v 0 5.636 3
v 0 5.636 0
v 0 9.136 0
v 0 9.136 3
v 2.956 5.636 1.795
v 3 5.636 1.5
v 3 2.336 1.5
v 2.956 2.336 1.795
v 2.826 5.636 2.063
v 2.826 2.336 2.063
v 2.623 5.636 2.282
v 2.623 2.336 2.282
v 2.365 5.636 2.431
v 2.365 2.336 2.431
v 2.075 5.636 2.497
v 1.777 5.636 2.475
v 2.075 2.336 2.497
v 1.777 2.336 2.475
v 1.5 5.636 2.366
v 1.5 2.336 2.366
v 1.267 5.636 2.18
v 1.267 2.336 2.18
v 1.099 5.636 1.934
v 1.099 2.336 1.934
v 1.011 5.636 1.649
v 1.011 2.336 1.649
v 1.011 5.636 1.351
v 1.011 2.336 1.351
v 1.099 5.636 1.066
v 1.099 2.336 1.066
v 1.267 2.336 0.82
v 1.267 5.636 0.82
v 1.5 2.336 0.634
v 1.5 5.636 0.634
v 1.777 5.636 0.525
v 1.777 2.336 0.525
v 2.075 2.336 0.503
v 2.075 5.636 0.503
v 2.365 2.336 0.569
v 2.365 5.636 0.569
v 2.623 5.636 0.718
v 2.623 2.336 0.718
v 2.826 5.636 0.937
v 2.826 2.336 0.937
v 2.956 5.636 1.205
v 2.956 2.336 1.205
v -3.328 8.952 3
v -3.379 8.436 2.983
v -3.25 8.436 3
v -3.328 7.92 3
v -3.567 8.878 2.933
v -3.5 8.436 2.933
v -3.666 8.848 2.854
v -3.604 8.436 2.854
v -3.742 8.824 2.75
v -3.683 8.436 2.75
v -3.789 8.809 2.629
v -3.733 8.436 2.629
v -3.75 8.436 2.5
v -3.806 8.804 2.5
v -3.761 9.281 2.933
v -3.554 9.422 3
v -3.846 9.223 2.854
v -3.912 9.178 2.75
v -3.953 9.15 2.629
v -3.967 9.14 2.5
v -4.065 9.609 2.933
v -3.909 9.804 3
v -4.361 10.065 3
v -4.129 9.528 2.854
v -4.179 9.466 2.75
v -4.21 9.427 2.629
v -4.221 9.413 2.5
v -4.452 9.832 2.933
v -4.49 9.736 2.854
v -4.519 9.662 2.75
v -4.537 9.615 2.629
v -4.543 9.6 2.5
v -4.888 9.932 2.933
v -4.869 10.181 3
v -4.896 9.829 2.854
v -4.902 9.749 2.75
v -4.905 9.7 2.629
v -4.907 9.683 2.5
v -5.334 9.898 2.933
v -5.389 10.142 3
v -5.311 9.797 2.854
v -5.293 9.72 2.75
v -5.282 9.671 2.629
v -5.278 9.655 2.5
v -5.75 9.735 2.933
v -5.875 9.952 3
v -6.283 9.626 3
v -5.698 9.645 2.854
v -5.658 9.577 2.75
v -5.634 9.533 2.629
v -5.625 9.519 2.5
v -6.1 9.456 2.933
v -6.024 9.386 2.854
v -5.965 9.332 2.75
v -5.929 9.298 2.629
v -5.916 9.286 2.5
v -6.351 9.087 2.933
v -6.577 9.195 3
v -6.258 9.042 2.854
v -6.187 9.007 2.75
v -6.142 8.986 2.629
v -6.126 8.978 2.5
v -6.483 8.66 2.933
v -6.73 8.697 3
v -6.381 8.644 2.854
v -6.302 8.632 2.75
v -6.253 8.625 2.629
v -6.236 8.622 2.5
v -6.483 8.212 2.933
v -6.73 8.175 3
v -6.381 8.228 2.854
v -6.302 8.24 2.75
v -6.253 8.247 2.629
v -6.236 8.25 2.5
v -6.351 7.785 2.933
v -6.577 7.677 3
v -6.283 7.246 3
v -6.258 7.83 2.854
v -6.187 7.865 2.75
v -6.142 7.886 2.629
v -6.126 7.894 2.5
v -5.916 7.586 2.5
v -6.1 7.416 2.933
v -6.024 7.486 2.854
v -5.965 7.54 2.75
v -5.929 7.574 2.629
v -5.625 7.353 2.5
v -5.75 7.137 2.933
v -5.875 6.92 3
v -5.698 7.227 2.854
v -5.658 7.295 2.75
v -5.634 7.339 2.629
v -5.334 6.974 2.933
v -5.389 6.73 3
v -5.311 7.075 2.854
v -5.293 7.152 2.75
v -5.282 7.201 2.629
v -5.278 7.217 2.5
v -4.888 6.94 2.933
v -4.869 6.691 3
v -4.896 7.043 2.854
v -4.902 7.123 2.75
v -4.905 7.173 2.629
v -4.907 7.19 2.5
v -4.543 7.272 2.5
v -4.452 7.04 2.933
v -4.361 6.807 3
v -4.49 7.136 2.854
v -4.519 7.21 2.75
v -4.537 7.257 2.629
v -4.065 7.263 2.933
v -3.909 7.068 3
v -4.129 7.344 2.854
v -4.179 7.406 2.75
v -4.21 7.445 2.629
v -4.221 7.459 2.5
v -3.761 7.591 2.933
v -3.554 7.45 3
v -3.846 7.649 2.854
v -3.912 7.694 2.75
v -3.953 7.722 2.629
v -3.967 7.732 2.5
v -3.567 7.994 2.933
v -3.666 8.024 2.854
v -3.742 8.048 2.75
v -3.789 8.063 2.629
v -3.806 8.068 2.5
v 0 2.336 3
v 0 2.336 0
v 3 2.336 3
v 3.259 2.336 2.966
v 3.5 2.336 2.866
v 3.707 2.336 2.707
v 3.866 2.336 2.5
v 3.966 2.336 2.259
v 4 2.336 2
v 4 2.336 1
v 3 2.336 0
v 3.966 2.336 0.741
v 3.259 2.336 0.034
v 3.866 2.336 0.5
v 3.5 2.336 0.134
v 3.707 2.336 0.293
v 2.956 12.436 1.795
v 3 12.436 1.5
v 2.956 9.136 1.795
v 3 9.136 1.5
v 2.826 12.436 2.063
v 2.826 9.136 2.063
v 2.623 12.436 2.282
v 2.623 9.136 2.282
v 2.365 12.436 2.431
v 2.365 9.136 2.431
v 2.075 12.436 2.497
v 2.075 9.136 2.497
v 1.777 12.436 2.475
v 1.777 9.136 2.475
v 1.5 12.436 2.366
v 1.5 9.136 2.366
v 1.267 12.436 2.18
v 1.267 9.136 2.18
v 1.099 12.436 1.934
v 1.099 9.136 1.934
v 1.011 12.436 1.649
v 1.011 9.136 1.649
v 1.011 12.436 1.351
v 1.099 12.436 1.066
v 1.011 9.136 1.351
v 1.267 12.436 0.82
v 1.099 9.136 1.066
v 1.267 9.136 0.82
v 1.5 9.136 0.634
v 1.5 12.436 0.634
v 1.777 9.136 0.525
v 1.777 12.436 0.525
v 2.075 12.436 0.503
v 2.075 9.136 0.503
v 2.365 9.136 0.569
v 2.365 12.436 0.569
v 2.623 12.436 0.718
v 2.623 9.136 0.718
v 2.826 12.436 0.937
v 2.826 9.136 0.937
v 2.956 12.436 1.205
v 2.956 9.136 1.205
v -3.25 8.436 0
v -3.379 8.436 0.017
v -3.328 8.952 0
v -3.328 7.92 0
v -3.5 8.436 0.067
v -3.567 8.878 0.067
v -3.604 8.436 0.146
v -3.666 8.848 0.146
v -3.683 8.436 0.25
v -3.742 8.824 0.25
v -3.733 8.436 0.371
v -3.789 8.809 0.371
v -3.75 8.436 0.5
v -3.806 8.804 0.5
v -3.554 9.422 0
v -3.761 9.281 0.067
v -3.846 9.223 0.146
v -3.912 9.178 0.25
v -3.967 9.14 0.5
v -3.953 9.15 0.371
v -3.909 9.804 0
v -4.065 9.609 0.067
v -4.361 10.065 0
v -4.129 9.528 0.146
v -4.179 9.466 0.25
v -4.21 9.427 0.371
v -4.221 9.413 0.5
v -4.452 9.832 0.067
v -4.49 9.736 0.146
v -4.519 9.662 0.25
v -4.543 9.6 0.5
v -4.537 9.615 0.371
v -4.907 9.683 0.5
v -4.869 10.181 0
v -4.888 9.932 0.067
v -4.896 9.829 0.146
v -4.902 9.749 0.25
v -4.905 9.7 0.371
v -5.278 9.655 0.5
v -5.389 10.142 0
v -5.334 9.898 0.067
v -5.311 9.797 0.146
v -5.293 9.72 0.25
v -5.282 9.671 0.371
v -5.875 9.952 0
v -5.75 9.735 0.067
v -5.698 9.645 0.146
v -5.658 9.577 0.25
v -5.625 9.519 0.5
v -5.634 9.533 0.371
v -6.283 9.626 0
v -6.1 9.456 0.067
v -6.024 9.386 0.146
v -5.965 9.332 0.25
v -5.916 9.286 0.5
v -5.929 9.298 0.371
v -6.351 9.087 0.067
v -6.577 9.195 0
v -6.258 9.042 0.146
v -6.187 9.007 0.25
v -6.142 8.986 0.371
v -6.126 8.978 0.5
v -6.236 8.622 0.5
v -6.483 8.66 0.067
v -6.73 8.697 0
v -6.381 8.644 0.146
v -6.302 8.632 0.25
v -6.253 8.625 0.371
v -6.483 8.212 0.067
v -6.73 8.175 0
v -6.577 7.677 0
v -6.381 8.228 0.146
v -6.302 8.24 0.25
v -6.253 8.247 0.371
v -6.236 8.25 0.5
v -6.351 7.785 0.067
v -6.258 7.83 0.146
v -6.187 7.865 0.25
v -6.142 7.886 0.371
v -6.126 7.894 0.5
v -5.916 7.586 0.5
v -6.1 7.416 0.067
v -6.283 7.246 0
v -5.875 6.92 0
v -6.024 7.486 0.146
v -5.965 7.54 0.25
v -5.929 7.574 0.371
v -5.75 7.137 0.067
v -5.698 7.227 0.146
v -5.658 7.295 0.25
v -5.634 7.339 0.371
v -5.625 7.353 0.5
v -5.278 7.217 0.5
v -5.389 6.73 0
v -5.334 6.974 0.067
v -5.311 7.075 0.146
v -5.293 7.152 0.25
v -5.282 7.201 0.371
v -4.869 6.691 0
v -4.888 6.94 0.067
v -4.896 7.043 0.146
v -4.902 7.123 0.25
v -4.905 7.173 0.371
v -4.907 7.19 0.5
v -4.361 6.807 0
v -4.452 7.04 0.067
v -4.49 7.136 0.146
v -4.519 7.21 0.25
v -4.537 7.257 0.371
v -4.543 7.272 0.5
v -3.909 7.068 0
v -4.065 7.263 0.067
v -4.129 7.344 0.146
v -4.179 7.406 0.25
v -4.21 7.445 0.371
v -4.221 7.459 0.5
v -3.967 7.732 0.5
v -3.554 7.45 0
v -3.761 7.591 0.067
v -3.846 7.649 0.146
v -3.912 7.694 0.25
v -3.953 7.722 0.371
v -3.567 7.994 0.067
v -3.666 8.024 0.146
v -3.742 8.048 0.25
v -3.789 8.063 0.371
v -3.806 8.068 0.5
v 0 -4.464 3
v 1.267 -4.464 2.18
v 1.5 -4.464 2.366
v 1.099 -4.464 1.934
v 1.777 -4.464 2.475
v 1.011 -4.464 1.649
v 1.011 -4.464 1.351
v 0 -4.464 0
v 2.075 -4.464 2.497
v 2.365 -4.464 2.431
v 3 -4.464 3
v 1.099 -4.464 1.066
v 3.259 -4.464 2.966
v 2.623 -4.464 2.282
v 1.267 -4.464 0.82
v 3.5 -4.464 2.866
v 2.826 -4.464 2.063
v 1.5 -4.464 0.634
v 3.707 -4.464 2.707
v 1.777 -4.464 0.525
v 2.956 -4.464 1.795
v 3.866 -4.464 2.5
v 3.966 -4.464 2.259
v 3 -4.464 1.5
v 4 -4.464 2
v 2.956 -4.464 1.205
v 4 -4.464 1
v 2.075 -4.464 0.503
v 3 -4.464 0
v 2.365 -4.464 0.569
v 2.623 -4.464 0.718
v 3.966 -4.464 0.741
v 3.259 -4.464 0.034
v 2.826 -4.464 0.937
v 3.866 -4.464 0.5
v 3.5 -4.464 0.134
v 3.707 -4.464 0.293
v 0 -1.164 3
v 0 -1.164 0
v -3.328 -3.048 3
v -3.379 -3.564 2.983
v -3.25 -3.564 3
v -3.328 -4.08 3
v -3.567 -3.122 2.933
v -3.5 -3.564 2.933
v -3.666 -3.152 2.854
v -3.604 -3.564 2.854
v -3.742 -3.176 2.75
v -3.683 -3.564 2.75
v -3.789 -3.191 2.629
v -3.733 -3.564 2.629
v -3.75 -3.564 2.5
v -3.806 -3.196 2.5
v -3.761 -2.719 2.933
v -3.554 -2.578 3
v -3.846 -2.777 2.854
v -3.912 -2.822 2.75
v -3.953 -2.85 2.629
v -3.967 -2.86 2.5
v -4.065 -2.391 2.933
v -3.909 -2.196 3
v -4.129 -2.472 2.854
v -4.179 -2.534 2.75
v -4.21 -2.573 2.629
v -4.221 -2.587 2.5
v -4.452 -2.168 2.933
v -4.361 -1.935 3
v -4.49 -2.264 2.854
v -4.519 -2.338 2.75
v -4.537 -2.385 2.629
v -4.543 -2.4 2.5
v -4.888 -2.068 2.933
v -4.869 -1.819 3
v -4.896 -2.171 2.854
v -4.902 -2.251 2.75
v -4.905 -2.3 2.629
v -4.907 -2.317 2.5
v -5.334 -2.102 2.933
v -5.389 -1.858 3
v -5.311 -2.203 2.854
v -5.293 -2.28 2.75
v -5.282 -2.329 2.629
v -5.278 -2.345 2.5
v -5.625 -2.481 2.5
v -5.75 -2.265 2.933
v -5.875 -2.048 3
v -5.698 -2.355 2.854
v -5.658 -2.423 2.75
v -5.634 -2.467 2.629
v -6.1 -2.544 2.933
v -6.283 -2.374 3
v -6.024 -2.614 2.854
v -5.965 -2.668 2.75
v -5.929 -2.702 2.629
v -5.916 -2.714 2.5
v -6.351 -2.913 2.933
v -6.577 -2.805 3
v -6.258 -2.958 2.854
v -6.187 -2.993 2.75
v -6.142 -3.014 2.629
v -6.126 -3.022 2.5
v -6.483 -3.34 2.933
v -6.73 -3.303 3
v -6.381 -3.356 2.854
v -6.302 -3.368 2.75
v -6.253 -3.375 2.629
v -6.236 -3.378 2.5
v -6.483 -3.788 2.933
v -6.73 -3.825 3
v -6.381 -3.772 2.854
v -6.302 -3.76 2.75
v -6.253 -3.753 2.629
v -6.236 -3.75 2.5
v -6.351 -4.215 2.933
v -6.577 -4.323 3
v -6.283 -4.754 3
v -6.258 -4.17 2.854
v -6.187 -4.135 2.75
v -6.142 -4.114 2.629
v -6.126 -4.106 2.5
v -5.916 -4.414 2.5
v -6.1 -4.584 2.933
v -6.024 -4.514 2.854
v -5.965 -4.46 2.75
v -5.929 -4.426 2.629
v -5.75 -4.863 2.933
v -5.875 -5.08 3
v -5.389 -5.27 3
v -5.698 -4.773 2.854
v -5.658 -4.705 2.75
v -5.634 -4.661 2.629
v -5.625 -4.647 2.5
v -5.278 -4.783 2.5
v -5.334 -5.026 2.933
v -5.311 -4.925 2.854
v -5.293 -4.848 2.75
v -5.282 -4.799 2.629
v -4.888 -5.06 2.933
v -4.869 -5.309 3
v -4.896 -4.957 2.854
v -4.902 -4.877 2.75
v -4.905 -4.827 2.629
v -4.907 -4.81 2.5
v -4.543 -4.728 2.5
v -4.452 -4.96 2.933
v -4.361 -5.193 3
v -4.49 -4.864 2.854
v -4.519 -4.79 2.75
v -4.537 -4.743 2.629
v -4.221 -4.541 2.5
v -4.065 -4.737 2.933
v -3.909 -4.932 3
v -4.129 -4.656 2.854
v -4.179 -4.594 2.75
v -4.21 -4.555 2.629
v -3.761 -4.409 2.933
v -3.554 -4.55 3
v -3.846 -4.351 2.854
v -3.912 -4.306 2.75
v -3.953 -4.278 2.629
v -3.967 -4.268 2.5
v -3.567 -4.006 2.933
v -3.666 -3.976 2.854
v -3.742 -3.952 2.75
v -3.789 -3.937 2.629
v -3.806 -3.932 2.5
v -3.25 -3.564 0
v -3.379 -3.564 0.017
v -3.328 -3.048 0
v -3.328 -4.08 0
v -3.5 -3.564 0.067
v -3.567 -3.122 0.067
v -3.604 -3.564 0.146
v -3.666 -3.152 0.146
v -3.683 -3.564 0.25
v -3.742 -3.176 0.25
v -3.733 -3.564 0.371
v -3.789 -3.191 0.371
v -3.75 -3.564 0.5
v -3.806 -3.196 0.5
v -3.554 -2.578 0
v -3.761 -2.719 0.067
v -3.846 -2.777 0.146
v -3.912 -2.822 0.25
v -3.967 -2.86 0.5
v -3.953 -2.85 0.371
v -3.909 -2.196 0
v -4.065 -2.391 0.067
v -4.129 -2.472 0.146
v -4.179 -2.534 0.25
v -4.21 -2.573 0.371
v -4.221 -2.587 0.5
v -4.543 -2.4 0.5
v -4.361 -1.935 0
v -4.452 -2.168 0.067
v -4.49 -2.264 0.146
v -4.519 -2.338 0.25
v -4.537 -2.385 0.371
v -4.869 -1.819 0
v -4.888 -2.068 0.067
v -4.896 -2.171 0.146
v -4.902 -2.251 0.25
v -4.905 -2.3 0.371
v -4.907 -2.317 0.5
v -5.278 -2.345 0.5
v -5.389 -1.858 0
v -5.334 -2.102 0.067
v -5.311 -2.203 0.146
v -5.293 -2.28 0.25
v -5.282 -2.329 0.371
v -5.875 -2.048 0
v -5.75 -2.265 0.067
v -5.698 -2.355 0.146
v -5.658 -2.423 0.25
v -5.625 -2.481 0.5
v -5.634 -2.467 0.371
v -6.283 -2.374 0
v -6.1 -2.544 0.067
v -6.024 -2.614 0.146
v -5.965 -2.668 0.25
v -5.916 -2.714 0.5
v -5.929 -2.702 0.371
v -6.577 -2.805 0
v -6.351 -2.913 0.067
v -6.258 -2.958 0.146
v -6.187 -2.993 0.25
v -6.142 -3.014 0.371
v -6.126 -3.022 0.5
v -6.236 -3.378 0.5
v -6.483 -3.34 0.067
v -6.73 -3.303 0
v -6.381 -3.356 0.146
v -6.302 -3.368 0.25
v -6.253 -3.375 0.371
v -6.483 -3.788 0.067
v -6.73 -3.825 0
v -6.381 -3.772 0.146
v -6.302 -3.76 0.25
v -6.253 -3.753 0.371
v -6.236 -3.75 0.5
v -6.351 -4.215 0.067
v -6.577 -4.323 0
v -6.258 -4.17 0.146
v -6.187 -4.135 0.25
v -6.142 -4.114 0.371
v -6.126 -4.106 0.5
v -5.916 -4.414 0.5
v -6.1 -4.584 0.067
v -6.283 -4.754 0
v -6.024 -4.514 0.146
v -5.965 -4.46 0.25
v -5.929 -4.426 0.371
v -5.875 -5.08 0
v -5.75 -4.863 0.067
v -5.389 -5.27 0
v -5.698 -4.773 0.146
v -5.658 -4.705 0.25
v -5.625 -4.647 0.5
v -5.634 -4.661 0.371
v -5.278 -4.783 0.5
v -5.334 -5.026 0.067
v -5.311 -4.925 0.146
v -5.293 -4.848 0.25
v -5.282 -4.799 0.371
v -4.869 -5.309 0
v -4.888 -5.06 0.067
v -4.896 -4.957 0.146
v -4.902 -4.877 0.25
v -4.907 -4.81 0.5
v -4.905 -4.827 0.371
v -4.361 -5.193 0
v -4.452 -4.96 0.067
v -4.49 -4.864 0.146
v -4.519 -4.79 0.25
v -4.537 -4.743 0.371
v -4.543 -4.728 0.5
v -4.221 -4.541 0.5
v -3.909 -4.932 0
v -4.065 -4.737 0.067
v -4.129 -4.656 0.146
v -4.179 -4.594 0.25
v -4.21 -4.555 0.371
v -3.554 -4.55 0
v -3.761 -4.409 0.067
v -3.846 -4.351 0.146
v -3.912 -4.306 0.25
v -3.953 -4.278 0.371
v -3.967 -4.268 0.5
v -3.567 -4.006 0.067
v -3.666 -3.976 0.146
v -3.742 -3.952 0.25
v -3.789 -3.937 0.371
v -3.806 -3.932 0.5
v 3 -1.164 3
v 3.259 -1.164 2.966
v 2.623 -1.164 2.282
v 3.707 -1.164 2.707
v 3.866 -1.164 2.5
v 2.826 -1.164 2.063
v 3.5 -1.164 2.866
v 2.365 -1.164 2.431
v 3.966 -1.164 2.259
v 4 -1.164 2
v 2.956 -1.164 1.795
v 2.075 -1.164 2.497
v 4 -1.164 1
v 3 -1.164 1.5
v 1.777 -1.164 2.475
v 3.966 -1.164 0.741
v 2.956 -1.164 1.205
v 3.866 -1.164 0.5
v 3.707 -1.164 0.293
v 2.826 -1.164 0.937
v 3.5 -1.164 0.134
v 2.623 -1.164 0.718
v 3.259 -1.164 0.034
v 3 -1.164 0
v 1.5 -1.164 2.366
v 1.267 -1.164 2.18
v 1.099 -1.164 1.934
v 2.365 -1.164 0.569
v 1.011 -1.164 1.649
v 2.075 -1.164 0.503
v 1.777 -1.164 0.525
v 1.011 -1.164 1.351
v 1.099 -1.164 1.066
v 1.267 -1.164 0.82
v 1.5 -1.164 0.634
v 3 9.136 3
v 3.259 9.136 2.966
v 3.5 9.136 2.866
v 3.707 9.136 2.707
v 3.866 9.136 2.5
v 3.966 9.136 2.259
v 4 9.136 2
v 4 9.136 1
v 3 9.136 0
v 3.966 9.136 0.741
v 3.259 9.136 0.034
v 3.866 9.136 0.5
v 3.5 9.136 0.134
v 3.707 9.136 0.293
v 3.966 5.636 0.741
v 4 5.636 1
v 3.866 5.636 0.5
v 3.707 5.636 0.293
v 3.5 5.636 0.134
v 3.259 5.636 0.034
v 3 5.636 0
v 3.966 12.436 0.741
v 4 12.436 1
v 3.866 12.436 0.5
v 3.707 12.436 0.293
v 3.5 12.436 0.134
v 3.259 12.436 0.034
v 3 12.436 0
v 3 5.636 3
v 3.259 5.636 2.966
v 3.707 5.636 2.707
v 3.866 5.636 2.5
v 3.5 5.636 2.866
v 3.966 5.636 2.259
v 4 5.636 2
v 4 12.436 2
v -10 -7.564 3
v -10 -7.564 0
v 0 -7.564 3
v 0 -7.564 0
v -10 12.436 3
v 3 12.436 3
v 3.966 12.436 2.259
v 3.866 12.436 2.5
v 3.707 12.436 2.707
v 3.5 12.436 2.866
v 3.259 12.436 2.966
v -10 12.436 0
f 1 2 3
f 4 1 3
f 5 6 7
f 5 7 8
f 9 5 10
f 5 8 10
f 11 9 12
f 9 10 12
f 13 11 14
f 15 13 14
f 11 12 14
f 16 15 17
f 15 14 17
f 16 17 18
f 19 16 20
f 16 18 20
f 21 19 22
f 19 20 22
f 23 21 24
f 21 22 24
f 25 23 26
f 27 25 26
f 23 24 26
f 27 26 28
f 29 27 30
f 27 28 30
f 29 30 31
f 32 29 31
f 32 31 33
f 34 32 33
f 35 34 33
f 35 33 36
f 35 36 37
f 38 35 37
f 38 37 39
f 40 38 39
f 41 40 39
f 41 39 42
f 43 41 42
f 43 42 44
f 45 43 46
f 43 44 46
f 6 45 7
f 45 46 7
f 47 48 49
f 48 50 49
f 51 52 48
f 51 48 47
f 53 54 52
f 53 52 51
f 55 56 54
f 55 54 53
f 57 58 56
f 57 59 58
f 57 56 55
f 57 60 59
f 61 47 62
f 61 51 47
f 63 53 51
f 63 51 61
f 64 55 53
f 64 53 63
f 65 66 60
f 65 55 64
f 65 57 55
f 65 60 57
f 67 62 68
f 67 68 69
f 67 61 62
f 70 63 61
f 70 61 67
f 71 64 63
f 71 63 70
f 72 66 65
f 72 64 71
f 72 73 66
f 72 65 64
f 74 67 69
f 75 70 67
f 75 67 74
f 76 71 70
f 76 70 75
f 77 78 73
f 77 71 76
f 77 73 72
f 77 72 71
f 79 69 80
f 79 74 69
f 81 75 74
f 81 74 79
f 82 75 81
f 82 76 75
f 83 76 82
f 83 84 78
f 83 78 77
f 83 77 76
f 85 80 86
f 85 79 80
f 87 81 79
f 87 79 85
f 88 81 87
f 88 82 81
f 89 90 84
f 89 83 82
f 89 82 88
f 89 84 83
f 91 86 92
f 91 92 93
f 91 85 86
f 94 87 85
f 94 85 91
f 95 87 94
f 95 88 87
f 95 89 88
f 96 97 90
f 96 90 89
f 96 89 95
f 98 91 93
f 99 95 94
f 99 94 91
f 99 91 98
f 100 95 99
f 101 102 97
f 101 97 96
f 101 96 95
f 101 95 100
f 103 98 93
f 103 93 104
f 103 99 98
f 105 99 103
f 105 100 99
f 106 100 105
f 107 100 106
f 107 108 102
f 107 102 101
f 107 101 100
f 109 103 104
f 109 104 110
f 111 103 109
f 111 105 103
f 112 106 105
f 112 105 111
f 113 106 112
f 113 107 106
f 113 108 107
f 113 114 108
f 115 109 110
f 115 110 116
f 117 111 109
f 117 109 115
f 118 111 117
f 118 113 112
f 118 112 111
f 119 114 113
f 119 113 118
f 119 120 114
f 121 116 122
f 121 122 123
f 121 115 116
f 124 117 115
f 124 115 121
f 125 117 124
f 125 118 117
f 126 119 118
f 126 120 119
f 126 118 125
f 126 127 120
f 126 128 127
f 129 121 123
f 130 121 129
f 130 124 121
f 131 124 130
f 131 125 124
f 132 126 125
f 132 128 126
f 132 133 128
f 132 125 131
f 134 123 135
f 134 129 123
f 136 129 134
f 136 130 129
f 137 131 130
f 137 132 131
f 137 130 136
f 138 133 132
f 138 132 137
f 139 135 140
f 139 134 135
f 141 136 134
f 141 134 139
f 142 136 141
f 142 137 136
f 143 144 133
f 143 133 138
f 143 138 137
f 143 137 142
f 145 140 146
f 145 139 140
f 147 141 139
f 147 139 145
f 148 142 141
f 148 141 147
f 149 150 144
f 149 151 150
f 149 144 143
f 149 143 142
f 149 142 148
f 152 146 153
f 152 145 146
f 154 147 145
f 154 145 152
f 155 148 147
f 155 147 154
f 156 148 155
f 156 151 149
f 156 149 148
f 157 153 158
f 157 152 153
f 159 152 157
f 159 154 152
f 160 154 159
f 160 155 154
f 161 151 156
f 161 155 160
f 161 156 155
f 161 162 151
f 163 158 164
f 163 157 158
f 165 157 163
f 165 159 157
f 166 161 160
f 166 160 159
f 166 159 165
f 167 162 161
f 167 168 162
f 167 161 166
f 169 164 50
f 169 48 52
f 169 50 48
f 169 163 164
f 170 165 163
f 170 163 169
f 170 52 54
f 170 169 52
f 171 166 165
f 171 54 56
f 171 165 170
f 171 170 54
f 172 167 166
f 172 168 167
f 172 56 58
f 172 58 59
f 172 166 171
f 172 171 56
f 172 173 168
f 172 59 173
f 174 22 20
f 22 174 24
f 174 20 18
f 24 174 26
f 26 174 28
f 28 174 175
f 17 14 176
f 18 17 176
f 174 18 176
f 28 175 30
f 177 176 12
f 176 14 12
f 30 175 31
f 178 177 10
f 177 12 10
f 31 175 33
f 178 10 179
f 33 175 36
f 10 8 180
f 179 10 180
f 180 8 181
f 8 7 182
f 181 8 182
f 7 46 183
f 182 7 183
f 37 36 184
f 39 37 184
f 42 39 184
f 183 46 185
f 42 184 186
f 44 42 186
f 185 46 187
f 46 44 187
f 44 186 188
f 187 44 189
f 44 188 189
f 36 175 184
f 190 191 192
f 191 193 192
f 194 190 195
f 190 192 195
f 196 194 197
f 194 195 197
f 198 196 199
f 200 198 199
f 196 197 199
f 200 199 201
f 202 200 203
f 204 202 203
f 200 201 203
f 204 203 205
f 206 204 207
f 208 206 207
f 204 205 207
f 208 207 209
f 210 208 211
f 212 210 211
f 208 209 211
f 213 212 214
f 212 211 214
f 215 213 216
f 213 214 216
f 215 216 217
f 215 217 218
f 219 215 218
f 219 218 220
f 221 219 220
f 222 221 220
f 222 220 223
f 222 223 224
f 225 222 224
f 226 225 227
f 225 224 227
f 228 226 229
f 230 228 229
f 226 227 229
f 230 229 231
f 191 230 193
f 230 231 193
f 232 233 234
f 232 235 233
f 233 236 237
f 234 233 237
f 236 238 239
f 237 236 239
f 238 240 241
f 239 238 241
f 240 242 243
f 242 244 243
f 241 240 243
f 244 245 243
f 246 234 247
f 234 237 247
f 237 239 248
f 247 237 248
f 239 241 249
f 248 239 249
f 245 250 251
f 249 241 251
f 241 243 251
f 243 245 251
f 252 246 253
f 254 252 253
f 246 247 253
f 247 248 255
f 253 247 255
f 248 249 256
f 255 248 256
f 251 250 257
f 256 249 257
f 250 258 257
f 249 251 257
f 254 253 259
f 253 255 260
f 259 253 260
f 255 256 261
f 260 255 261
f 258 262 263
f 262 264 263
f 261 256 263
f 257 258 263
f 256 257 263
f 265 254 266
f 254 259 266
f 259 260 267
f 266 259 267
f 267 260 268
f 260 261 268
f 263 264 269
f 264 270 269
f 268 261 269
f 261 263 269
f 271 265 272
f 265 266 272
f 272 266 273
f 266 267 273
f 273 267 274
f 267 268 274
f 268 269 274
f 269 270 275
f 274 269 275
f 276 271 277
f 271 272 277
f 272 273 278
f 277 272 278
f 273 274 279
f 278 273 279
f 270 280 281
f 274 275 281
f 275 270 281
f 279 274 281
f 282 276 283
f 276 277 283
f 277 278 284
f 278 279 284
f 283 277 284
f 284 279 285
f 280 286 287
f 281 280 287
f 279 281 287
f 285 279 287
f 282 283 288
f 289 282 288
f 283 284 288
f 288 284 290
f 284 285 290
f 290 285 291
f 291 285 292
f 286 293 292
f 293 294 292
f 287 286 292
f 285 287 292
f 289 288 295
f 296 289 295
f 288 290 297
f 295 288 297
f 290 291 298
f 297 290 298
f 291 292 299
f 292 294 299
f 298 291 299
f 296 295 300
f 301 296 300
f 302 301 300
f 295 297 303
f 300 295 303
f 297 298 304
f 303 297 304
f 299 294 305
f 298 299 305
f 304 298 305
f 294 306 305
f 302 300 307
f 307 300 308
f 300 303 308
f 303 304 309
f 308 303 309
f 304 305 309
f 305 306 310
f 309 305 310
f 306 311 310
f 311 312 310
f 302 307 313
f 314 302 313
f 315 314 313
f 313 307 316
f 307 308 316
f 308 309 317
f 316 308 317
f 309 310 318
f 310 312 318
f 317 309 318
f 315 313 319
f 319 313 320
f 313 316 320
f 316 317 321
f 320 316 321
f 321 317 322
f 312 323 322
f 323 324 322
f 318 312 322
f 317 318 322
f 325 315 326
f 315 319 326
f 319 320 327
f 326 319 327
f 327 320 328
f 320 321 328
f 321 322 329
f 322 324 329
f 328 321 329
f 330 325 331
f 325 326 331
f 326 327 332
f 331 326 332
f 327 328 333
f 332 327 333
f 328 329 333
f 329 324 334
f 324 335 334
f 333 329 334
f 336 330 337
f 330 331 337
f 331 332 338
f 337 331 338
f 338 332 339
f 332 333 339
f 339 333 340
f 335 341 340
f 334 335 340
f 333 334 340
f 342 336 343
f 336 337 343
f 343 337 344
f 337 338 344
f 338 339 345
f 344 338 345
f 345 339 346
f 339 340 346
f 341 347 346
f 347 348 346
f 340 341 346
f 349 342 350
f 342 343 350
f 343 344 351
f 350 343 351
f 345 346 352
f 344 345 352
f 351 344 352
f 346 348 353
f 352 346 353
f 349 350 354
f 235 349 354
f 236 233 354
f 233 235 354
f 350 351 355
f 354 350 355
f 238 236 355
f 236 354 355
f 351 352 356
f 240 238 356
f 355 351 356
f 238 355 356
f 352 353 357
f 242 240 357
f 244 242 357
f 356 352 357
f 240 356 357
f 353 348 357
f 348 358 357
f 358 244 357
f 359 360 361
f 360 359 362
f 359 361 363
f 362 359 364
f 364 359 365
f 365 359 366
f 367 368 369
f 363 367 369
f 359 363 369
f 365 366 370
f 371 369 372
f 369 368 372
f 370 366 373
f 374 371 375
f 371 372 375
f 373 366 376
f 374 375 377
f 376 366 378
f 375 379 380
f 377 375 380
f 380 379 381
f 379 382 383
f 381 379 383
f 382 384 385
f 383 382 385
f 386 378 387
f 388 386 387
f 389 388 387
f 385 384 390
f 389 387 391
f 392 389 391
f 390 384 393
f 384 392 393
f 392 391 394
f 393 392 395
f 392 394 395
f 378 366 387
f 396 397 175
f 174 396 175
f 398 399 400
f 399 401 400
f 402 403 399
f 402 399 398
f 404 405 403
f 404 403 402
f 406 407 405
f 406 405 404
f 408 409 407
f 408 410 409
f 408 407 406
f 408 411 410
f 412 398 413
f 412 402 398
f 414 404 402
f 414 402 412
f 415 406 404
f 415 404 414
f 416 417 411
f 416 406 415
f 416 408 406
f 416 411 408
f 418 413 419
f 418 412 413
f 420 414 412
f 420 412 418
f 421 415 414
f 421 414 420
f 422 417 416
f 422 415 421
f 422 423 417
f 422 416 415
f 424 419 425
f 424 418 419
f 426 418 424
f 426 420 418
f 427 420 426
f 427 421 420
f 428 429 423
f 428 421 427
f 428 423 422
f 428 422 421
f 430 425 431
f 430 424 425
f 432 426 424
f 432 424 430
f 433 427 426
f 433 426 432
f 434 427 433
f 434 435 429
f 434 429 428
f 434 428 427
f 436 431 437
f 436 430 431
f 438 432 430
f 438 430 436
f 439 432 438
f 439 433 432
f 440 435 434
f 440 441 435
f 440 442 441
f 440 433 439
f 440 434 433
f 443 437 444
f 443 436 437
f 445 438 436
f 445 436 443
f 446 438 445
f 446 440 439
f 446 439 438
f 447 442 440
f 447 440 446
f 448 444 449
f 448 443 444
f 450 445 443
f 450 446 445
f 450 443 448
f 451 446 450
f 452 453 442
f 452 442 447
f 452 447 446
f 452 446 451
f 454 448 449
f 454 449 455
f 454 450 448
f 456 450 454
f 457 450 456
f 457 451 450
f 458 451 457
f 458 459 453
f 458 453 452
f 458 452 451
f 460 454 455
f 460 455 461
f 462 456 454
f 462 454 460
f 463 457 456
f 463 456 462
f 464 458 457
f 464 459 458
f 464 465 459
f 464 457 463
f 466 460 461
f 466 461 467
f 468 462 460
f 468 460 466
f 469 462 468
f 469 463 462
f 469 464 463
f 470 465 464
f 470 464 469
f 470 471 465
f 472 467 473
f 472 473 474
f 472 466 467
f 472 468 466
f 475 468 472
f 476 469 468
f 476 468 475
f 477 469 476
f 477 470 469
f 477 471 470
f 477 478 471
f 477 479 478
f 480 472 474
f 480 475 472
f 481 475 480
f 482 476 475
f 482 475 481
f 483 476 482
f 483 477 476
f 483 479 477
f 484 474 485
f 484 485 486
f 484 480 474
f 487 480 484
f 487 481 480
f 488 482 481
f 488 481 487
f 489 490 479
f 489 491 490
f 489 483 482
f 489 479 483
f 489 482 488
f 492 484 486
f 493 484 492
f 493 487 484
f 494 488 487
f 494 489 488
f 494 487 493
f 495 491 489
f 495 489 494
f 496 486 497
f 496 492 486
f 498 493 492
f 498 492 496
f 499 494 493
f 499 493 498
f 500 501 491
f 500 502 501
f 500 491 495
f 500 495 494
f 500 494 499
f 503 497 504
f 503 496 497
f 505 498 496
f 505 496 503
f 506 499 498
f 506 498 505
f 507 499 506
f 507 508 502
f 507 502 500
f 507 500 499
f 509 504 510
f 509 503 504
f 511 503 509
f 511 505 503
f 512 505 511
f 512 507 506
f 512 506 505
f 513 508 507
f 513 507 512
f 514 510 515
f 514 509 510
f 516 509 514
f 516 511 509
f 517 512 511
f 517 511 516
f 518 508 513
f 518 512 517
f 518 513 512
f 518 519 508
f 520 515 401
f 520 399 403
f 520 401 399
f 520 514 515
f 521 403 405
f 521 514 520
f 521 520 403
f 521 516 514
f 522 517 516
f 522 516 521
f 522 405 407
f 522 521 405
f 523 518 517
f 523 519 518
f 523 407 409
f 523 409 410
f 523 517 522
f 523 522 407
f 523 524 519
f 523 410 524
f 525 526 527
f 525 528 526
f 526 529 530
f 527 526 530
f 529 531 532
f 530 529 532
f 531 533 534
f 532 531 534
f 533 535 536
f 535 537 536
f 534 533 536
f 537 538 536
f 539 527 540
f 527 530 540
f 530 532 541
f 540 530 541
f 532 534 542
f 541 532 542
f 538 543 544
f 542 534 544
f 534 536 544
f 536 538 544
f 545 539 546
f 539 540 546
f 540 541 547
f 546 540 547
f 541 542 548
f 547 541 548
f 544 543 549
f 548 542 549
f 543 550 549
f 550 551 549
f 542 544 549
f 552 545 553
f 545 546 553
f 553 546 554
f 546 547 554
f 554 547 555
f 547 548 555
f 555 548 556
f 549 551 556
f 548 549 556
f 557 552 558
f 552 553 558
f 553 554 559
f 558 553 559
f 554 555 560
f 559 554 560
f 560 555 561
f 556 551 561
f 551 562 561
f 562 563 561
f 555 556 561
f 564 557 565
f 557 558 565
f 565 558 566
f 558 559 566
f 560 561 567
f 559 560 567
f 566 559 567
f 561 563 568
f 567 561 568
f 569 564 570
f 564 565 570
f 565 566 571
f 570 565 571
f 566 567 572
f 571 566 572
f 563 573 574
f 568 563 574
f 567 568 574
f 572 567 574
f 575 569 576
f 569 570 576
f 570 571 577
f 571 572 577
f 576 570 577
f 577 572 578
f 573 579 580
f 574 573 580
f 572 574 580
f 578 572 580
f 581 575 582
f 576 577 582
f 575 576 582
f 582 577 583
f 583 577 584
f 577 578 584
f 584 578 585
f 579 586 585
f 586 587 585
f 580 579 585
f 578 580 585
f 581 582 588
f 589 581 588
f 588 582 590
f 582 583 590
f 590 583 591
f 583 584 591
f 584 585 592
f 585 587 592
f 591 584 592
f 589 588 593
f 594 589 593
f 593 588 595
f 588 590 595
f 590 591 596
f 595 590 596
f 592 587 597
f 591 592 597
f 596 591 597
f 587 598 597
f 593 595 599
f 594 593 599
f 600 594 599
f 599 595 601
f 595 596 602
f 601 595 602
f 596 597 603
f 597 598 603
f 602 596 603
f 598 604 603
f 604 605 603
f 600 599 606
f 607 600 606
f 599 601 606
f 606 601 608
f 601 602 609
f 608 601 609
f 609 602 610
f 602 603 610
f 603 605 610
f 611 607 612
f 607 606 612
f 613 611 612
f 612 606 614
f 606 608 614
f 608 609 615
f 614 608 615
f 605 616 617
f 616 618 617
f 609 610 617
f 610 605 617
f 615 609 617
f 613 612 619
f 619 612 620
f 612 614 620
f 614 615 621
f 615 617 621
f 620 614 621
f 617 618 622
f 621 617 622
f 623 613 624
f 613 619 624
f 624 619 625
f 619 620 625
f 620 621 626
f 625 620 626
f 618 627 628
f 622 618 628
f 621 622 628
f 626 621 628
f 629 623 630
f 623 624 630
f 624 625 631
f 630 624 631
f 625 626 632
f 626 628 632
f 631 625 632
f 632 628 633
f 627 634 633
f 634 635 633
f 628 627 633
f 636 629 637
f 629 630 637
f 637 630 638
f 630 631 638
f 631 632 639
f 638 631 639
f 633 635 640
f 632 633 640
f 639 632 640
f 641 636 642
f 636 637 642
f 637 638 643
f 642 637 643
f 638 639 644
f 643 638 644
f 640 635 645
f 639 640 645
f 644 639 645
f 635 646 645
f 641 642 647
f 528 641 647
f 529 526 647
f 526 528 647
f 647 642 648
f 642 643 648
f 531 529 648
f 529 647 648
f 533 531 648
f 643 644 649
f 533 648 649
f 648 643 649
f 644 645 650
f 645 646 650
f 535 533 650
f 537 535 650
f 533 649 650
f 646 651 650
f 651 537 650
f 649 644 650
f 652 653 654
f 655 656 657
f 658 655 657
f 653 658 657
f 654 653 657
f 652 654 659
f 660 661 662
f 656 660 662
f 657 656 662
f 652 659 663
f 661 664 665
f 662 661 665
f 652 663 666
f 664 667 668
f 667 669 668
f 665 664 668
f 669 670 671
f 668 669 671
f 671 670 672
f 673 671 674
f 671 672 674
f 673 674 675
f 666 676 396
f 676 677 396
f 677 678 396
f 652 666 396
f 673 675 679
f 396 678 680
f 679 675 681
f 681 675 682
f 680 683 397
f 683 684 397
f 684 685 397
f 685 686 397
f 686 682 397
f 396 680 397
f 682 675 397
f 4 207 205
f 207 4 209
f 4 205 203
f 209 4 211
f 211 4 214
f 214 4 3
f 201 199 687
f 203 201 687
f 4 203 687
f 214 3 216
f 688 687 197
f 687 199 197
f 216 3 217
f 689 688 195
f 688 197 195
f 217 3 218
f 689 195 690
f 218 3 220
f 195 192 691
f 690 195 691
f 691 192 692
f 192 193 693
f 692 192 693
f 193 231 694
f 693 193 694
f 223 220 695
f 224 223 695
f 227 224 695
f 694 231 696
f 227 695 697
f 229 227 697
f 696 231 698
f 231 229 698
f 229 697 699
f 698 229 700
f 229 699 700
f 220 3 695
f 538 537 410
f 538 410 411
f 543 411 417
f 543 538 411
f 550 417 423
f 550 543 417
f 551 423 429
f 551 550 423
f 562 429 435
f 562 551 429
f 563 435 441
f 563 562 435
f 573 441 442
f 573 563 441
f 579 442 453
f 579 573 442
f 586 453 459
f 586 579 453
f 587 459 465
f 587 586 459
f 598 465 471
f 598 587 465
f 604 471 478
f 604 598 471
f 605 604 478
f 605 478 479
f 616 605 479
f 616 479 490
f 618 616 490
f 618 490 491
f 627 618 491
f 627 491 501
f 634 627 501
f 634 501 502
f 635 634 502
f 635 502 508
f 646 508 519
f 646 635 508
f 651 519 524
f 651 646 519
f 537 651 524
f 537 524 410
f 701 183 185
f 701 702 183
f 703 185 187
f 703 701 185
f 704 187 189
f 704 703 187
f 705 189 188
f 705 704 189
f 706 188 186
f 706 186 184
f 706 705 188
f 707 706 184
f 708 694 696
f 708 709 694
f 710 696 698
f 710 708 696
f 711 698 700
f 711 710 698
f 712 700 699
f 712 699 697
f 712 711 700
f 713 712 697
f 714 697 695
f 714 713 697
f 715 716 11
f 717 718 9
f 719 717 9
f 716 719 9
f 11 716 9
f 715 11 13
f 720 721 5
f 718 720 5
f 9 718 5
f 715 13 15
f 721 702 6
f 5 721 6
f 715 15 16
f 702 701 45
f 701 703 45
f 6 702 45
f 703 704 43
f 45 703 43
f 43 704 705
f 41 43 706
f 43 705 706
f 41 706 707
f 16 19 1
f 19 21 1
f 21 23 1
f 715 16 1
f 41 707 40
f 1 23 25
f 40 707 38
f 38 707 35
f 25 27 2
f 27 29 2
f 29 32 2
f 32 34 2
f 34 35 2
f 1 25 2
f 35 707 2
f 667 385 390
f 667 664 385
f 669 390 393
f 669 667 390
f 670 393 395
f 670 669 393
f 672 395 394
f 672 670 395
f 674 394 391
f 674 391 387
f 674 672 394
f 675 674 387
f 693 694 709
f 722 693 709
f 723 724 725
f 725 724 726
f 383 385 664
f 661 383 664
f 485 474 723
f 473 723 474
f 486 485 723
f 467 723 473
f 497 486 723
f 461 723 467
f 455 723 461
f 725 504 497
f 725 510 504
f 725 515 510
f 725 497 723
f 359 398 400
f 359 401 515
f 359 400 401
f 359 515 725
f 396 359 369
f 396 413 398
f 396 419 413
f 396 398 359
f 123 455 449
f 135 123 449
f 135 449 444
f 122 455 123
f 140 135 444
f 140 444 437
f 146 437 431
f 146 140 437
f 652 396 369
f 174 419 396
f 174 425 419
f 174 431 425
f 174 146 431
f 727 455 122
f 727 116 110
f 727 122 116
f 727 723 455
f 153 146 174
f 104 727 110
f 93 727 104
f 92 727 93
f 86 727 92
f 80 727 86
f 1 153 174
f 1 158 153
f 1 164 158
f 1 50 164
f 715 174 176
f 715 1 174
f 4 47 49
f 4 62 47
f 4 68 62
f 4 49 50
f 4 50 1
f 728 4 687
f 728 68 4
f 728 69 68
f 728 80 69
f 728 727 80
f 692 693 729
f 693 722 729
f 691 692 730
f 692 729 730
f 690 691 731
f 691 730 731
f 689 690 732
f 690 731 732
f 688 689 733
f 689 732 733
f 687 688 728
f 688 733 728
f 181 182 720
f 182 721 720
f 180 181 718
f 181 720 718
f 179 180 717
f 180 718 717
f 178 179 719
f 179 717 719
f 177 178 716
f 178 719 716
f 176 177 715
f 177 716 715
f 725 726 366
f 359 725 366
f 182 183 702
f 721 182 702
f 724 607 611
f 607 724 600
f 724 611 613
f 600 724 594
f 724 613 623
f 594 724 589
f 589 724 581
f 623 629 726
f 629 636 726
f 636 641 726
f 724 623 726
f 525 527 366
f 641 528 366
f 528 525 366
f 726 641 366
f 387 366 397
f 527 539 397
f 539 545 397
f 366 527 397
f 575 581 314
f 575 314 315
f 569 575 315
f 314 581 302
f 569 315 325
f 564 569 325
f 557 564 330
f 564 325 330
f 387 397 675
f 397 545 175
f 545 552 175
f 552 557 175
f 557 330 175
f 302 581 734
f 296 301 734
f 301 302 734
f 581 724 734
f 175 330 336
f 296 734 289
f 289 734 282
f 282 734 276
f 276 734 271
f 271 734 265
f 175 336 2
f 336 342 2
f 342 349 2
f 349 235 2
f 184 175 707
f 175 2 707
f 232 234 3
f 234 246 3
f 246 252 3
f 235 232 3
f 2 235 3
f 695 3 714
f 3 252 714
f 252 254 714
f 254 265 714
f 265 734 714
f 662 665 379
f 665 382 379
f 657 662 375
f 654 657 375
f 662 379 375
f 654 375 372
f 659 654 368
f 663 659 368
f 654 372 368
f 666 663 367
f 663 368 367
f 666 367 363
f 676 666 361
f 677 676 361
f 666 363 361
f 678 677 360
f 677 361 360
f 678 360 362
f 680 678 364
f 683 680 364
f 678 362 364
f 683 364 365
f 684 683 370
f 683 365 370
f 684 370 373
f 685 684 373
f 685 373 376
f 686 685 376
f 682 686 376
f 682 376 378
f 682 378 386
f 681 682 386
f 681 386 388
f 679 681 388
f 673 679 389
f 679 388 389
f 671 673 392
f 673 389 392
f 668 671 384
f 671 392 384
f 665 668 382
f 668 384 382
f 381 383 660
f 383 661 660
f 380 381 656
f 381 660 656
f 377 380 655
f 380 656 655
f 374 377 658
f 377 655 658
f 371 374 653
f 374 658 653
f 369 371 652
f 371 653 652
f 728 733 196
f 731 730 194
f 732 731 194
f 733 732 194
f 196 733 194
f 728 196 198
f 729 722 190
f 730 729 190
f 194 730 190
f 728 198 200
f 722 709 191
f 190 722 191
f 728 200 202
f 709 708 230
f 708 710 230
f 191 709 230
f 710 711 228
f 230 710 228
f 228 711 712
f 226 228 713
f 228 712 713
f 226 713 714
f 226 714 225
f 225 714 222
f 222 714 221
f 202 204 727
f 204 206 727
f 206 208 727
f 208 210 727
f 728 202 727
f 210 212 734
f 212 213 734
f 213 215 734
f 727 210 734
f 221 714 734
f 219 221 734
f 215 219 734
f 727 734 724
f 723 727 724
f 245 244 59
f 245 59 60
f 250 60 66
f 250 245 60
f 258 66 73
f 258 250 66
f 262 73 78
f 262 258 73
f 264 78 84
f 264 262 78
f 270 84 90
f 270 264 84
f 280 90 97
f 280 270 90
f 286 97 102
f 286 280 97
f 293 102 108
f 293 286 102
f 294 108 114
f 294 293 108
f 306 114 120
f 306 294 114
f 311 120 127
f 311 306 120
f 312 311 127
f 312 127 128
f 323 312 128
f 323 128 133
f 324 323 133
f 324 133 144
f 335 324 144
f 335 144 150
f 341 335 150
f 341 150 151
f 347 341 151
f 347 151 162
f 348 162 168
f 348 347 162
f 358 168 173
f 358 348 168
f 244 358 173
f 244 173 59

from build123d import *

# Parameters (mm, degrees)
F0_R     = 1.25
F1_DEPTH = 1.355102
F2_R     = 0.4
F3_R     = 1
F4_DEPTH = 18.831681
F5_DEPTH = 3
F6_R     = 1
F9_R     = 0.5


with BuildPart() as f1:
    # F0 (on Top) → F1 (new body)
    with BuildSketch(Plane.XY):
        Polygon((0, 12.436029), (-10, 12.436029), (-10, -7.563971), (0, -7.563971), (0, -4.463971), (4, -4.463971), (4, -1.163971), (0, -1.163971), (0, 2.336029), (4, 2.336029), (4, 5.636029), (0, 5.636029), (0, 9.136029), (4, 9.136029), (4, 12.436029), align=None)
        with Locations((-5, -3.563971)):
            Circle(F0_R, mode=Mode.SUBTRACT)
        with Locations((-5, 8.436029)):
            Circle(F0_R, mode=Mode.SUBTRACT)
    extrude(amount=F1_DEPTH)

    # F2
    f2_edges = [f1.edges().sort_by_distance(p)[0] for p in [
        (4, -2.813971, 1.355102),
        (4, 3.986029, 1.355102),
        (4, 10.786029, 1.355102),
        (4, -2.813971, 0),
        (4, 3.986029, 0),
        (4, 10.786029, 0),
    ]]
    fillet(f2_edges, radius=F2_R)


with BuildPart() as f4:
    # F3 (on Front) → F4 (new body, symmetric)
    with BuildSketch(Plane.XZ):
        with Locations((2, 1.5)):
            Circle(F3_R)
    extrude(amount=F4_DEPTH, both=True)


with BuildPart() as f5:
    # F0 (on Top) → F5 (new body)
    with BuildSketch(Plane.XY):
        Polygon((0, 12.436029), (-10, 12.436029), (-10, -7.563971), (0, -7.563971), (0, -4.463971), (4, -4.463971), (4, -1.163971), (0, -1.163971), (0, 2.336029), (4, 2.336029), (4, 5.636029), (0, 5.636029), (0, 9.136029), (4, 9.136029), (4, 12.436029), align=None)
        with Locations((-5, -3.563971)):
            Circle(F0_R, mode=Mode.SUBTRACT)
        with Locations((-5, 8.436029)):
            Circle(F0_R, mode=Mode.SUBTRACT)
    extrude(amount=F5_DEPTH)

    # F6
    f6_edges = [f5.edges().sort_by_distance(p)[0] for p in [
        (4, -2.813971, 3),
        (4, 3.986029, 3),
        (4, 10.786029, 3),
        (4, 10.786029, 0),
        (4, 3.986029, 0),
        (4, -2.813971, 0),
    ]]
    fillet(f6_edges, radius=F6_R)

    # F7: cut F4
    add(f4.part, mode=Mode.SUBTRACT)

    # F9
    f9_edges = [f5.edges().sort_by_distance(p)[0] for p in [
        (-6.25, -3.563971, 3),
        (-6.25, 8.436029, 3),
        (-6.25, -3.563971, 0),
        (-6.25, 8.436029, 0),
    ]]
    fillet(f9_edges, radius=F9_R)


solid = f5.part
